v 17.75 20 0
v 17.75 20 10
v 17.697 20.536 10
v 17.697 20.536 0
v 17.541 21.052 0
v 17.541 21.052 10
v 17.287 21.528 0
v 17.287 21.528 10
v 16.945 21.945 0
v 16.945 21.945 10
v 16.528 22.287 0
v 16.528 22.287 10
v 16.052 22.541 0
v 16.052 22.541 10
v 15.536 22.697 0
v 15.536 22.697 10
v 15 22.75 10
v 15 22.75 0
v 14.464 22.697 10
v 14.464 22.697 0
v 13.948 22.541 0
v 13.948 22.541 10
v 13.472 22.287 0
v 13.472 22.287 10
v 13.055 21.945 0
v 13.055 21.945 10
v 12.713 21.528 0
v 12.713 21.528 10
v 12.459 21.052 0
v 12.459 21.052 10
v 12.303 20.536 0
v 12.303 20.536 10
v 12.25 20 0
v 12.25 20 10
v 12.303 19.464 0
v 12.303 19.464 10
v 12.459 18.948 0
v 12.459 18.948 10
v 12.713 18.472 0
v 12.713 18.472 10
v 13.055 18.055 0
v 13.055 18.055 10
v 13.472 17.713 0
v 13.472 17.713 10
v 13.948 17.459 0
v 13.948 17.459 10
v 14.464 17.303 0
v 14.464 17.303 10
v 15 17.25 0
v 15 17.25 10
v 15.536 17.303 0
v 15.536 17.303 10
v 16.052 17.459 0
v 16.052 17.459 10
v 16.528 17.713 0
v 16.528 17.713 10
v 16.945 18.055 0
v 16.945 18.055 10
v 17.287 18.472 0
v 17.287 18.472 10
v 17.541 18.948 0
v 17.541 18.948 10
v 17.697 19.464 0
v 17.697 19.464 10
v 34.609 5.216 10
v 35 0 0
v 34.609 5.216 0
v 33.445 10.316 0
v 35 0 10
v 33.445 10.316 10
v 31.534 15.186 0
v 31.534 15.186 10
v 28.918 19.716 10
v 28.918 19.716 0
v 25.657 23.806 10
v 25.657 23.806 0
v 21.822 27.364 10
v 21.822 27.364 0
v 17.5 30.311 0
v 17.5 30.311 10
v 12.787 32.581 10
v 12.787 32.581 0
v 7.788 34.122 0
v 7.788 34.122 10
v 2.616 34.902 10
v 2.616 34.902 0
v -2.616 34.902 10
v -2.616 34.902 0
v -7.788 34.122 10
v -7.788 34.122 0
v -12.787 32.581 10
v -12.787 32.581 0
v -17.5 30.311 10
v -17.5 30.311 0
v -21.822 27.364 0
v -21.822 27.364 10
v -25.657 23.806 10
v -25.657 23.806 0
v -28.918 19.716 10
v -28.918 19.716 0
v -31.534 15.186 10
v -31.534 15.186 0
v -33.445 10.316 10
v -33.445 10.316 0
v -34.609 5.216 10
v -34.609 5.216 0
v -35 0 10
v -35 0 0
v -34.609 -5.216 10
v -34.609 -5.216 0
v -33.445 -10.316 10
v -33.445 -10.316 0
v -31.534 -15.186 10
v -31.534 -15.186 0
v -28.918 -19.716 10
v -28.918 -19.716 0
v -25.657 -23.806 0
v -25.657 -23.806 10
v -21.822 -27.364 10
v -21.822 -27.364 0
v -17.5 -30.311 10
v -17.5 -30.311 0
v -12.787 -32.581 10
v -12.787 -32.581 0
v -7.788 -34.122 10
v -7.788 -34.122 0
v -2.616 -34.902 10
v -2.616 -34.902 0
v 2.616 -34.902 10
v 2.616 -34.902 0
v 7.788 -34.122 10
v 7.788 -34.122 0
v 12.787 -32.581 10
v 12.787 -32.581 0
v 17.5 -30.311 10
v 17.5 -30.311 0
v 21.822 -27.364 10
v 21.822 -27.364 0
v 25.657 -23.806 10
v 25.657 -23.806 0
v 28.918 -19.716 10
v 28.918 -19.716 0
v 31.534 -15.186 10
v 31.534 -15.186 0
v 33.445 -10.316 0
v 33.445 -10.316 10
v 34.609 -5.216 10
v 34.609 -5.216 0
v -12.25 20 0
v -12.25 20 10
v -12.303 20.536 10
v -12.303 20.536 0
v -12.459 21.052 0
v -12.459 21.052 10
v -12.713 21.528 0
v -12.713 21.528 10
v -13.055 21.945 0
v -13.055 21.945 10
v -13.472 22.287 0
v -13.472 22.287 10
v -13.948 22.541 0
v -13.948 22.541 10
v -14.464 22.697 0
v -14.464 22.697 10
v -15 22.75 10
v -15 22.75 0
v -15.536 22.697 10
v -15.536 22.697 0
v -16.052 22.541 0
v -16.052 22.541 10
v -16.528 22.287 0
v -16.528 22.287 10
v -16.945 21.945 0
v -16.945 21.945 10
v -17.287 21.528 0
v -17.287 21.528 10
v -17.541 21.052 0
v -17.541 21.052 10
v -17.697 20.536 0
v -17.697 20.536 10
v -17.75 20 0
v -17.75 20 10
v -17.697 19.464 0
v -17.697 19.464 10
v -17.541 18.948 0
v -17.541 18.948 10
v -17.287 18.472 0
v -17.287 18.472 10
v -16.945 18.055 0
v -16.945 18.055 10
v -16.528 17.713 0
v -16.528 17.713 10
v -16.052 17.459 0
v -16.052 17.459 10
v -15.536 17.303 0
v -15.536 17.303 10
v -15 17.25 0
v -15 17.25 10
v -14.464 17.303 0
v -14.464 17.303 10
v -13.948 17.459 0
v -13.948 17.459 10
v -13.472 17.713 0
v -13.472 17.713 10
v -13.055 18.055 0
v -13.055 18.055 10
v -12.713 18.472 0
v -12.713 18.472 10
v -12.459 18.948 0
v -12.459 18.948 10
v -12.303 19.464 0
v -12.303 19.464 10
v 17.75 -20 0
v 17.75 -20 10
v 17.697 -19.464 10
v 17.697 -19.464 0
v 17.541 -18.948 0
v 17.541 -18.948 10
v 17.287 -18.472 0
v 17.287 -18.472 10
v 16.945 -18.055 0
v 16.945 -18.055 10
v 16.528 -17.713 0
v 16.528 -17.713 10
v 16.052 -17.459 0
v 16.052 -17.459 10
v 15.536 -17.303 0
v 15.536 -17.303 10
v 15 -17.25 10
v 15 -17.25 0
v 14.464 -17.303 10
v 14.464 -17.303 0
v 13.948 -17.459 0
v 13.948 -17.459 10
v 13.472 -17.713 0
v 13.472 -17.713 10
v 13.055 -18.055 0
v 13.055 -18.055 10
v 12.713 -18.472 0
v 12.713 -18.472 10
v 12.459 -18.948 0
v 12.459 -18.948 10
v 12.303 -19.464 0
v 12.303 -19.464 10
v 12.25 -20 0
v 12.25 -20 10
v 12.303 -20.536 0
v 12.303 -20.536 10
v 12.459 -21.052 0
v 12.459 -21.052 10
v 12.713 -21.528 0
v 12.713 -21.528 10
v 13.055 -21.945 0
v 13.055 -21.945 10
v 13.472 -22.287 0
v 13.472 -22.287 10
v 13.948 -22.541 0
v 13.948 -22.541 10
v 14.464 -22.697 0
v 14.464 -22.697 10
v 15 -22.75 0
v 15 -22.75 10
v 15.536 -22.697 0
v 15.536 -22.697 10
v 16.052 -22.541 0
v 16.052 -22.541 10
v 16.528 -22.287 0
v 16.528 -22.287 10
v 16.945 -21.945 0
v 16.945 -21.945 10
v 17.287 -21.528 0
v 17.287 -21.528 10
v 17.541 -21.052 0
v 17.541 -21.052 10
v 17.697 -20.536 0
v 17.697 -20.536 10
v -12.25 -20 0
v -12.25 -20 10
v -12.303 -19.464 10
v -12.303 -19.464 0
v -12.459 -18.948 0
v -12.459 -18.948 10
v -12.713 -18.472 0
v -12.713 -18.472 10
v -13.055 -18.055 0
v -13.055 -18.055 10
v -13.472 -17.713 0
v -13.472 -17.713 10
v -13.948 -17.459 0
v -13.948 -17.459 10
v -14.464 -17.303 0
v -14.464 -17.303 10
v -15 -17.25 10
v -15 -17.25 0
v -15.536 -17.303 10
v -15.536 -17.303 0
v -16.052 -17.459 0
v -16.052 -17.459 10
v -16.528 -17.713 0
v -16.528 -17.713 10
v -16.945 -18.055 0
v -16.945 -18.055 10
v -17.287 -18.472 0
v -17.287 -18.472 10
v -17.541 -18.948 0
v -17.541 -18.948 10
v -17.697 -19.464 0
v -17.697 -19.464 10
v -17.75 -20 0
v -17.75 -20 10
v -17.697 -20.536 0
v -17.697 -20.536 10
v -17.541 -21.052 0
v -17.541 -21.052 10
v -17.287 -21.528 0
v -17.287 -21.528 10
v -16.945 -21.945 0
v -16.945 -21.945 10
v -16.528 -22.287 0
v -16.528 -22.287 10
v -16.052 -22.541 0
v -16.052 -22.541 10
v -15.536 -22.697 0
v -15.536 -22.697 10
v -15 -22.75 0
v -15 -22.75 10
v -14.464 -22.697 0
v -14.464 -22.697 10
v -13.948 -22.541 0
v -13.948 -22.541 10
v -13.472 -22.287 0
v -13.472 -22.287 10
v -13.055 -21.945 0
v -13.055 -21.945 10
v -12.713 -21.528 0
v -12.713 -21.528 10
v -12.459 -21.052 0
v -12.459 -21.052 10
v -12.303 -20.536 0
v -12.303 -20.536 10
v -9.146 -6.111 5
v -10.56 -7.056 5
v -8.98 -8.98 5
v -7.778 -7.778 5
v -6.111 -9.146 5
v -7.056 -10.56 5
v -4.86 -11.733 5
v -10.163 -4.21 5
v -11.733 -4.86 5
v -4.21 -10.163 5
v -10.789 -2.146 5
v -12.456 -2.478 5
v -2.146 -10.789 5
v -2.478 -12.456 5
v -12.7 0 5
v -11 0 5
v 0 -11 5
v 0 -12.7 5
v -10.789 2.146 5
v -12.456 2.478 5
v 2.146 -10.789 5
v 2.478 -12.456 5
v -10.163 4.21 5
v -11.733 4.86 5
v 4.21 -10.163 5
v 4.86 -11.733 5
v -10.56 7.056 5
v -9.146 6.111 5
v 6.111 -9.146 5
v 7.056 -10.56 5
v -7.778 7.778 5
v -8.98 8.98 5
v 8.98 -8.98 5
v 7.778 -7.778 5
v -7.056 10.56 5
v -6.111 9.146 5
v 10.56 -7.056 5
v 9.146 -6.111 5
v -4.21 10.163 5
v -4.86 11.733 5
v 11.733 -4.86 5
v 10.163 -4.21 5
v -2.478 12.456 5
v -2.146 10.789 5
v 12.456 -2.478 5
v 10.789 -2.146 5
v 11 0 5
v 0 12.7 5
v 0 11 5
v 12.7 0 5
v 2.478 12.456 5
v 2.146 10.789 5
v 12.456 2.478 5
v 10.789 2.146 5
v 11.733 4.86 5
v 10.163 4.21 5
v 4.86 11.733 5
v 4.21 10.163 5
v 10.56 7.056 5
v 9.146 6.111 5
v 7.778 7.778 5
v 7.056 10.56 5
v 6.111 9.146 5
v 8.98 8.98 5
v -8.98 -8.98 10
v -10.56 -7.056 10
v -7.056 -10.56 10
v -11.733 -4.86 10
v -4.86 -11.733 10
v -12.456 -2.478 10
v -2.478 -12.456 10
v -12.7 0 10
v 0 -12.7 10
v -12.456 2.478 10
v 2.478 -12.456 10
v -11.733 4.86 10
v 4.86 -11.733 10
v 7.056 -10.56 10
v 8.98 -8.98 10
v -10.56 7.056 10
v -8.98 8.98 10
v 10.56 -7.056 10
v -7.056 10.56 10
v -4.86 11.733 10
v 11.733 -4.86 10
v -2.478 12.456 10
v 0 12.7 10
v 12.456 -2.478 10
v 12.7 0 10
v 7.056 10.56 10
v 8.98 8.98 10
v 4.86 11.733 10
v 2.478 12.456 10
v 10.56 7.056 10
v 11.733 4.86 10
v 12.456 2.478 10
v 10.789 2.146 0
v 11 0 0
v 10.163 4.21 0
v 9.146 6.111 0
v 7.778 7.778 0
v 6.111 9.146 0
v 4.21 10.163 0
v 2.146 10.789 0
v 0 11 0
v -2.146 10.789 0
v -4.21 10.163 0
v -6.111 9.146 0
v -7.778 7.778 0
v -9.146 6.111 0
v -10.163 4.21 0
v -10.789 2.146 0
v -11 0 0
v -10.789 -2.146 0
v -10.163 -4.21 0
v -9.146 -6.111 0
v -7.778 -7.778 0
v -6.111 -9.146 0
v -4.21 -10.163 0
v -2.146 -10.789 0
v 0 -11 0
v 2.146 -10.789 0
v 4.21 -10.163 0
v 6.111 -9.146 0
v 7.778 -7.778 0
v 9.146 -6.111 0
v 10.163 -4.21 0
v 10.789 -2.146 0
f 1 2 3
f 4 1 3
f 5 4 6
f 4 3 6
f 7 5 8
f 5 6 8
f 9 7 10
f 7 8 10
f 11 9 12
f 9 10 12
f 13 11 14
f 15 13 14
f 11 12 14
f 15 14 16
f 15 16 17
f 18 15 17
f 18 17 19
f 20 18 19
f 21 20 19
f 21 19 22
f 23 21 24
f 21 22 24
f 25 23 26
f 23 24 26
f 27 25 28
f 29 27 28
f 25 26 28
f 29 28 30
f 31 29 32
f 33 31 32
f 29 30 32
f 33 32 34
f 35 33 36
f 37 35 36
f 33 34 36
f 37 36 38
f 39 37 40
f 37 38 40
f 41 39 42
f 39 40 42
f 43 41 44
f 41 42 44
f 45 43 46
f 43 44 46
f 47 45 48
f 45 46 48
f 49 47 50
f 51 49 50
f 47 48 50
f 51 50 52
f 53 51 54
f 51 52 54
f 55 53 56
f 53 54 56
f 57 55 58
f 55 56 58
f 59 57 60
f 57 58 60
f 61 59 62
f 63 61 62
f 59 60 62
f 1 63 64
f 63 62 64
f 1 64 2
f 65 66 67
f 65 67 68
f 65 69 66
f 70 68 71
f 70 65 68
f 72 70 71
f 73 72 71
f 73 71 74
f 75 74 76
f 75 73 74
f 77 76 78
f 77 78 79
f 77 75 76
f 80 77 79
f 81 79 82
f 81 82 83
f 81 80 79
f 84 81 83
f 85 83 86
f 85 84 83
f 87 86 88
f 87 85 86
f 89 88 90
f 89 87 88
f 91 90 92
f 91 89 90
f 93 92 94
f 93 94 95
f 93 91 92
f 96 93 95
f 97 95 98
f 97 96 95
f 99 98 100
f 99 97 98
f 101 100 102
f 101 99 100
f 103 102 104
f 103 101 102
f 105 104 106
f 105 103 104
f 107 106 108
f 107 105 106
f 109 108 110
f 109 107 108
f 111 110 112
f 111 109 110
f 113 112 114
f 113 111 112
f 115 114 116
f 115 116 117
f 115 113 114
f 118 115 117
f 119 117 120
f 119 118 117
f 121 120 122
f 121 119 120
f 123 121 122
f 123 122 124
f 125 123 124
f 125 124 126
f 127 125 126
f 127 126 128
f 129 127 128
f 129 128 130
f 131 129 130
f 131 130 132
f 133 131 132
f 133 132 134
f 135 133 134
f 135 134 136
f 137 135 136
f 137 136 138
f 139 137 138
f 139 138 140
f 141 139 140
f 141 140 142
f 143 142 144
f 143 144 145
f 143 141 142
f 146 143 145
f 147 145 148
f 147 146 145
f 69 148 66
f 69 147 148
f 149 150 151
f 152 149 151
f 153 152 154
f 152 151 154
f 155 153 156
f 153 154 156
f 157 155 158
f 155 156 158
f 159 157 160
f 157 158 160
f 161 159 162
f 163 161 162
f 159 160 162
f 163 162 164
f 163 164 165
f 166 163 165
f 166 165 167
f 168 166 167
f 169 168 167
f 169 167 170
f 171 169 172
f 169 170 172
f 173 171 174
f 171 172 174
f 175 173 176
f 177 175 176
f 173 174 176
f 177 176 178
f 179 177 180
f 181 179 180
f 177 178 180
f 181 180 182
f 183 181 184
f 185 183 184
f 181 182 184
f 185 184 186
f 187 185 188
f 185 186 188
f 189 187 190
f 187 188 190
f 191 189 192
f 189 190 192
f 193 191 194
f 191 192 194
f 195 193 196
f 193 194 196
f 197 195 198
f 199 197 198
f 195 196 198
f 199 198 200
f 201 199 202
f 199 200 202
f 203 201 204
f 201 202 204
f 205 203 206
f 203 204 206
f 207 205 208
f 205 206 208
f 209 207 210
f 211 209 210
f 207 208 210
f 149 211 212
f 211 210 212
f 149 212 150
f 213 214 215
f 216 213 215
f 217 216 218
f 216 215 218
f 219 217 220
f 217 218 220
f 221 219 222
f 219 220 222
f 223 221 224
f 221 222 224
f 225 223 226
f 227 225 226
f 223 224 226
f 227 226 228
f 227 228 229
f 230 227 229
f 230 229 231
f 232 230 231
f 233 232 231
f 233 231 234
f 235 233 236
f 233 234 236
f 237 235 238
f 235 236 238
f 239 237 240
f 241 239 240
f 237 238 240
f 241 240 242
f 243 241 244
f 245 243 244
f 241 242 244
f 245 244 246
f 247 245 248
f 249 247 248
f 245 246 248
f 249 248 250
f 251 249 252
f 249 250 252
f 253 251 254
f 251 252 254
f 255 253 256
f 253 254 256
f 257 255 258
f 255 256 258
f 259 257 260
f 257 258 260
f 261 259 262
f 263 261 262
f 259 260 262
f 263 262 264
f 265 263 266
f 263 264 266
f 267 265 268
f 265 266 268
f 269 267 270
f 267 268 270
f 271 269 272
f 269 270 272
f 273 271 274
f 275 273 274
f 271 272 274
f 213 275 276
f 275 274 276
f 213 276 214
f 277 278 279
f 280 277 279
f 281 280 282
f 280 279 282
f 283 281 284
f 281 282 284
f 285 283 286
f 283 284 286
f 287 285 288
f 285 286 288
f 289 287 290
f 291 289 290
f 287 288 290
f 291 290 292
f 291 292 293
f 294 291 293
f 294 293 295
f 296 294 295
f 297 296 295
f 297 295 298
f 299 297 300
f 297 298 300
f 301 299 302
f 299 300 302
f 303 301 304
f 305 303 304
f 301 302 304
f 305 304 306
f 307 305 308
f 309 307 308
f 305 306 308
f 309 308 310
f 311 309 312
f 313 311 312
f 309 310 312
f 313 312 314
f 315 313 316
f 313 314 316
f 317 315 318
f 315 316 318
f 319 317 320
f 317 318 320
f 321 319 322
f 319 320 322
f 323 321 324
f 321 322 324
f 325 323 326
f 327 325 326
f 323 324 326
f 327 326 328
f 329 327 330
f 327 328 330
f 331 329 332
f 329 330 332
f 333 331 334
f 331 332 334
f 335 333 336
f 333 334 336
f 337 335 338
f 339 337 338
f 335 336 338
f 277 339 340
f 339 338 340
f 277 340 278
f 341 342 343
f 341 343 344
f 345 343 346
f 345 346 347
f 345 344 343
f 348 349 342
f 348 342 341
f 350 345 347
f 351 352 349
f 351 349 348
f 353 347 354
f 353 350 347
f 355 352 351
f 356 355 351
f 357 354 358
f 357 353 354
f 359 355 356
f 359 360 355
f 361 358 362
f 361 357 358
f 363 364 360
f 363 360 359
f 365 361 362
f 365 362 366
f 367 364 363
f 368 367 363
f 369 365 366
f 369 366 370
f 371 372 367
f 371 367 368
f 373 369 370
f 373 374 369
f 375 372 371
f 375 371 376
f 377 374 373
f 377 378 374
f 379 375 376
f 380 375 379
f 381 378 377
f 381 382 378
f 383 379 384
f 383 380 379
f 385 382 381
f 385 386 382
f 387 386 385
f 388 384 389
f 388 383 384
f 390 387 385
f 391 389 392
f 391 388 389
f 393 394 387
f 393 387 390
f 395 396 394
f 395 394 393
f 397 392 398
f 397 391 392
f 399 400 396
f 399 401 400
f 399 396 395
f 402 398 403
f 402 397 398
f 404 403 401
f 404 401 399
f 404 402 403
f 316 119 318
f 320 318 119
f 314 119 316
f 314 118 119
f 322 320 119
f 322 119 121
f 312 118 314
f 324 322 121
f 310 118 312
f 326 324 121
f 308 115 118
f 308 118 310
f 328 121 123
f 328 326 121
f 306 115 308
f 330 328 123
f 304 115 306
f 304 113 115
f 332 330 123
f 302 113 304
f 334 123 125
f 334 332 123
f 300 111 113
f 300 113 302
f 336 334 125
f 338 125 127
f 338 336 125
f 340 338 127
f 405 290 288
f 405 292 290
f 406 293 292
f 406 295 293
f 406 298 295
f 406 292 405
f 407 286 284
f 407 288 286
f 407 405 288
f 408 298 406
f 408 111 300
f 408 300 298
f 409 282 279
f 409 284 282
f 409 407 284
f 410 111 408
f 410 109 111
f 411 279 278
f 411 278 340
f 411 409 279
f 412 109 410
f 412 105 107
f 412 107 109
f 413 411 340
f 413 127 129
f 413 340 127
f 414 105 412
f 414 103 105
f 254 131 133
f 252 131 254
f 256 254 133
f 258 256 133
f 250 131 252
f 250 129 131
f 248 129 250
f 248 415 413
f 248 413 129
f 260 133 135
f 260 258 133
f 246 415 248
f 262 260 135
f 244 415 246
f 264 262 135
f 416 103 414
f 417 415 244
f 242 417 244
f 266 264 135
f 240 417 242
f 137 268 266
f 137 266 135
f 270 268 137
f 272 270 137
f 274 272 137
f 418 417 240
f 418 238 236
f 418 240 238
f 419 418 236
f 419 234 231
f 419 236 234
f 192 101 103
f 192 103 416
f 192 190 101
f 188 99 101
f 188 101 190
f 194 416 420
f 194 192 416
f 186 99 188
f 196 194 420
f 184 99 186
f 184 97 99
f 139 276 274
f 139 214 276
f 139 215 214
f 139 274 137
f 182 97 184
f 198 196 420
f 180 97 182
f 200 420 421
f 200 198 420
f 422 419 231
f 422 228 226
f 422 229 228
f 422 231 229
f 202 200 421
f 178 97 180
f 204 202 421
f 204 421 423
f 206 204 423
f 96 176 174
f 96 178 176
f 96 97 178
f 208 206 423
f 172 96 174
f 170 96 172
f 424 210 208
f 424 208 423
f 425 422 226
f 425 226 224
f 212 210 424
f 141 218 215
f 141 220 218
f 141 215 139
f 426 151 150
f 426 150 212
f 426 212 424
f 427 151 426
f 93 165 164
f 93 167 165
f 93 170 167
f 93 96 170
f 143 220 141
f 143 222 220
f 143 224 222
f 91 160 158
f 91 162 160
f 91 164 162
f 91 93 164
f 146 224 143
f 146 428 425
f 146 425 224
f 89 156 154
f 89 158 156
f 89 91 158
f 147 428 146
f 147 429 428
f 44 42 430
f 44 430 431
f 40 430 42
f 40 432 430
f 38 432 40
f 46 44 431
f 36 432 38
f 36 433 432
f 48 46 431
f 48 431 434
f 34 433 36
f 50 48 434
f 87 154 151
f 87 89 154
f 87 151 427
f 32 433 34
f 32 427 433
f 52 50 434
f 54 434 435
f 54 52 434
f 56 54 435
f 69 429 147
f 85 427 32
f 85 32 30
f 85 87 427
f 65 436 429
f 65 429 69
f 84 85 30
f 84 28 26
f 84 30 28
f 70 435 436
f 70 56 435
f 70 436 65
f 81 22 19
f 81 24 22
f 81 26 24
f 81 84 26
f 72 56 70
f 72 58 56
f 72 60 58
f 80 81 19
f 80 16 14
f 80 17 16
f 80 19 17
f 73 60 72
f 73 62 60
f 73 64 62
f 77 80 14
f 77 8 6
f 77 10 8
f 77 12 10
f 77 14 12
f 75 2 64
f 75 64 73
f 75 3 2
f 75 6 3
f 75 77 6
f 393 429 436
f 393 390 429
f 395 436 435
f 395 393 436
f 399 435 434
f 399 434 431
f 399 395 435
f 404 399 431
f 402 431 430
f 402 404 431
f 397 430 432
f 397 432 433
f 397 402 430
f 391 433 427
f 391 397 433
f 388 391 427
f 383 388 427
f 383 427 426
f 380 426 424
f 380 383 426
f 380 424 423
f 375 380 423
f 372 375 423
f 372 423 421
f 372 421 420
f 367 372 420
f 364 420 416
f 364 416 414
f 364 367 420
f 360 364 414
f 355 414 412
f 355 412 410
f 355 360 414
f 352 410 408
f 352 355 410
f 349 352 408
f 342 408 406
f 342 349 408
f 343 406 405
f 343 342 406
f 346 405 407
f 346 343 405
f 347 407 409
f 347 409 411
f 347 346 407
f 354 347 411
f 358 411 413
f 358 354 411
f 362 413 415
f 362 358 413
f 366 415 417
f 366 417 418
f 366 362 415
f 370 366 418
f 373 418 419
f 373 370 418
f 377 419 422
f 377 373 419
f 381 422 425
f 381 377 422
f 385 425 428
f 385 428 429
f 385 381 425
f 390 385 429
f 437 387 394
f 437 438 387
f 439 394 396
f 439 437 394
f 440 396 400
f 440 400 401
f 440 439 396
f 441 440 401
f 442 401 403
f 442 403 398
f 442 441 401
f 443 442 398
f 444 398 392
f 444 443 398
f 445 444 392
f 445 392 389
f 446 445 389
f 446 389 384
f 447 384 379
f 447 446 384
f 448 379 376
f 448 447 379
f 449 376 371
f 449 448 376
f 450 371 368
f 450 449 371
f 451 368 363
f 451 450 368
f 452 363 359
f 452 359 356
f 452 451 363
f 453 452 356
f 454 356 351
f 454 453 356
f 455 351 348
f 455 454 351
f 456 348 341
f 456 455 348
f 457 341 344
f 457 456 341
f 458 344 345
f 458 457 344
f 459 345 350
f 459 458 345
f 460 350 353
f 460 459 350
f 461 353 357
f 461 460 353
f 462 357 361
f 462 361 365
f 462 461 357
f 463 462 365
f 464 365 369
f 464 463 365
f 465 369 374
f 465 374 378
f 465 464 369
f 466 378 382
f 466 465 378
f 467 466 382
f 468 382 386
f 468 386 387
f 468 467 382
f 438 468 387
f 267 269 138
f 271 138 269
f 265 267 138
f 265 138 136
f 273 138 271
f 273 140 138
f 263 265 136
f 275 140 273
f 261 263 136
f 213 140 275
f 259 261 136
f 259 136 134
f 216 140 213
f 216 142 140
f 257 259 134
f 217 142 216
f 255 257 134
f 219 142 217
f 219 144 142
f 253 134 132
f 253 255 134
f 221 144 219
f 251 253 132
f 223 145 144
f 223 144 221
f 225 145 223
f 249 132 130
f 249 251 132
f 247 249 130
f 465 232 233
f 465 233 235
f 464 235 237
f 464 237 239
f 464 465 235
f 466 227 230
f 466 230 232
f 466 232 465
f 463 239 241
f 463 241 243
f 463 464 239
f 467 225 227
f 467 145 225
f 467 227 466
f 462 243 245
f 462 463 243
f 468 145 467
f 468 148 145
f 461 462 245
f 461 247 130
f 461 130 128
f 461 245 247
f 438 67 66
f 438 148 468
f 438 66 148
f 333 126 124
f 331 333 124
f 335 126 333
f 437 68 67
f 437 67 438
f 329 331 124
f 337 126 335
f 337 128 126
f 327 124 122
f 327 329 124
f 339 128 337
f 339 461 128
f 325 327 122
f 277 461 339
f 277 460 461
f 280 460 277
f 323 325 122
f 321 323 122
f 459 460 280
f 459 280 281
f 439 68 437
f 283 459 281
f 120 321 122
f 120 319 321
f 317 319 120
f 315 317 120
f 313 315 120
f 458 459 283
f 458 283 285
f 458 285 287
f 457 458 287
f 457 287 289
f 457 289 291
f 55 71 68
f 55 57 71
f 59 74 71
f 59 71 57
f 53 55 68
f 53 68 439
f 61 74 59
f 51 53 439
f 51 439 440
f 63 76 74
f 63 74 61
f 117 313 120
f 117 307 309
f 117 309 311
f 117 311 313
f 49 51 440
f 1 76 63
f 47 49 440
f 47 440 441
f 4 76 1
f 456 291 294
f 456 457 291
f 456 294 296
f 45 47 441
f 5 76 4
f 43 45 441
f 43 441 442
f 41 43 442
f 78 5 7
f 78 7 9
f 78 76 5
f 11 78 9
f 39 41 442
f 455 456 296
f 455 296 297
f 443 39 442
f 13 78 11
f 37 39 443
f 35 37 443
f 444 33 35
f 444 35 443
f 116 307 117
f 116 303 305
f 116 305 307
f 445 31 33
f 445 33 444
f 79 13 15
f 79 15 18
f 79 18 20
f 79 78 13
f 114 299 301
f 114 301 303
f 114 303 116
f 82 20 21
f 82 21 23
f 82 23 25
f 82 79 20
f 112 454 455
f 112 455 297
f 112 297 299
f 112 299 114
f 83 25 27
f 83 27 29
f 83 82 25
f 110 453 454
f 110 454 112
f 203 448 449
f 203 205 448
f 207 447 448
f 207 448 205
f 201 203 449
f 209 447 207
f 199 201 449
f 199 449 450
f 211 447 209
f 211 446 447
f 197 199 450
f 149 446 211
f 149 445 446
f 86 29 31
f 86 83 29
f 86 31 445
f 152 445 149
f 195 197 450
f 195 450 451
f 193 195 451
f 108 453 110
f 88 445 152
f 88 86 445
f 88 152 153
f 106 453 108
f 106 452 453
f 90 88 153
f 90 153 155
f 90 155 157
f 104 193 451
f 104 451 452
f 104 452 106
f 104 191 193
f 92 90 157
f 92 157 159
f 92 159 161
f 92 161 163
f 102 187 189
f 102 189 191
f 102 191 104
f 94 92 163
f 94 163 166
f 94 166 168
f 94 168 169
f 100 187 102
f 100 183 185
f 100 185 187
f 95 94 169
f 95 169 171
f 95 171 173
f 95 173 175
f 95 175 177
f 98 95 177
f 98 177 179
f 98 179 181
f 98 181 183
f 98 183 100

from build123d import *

# Parameters (mm, degrees)
F2_R     = 2.75
F3_DEPTH = 10


with BuildPart() as f1:
    # F0 (on Front) → F1 (revolve)
    with BuildSketch(Plane.XZ):
        Polygon((11, 5), (11, 0), (35, 0), (35, 10), (12.7, 10), (12.7, 5), align=None)
    revolve(axis=Axis((0, 0, 6.447879), (0, 0, 1)))

    # F2 (on face) → F3 (cut)
    with BuildSketch(Plane.XY.offset(10)):
        with Locations((-15, 20)):
            Circle(F2_R)
        with Locations((-15, -20)):
            Circle(F2_R)
        with Locations((15, -20)):
            Circle(F2_R)
        with Locations((15, 20)):
            Circle(F2_R)
    extrude(amount=-F3_DEPTH, mode=Mode.SUBTRACT)


solid = f1.part
